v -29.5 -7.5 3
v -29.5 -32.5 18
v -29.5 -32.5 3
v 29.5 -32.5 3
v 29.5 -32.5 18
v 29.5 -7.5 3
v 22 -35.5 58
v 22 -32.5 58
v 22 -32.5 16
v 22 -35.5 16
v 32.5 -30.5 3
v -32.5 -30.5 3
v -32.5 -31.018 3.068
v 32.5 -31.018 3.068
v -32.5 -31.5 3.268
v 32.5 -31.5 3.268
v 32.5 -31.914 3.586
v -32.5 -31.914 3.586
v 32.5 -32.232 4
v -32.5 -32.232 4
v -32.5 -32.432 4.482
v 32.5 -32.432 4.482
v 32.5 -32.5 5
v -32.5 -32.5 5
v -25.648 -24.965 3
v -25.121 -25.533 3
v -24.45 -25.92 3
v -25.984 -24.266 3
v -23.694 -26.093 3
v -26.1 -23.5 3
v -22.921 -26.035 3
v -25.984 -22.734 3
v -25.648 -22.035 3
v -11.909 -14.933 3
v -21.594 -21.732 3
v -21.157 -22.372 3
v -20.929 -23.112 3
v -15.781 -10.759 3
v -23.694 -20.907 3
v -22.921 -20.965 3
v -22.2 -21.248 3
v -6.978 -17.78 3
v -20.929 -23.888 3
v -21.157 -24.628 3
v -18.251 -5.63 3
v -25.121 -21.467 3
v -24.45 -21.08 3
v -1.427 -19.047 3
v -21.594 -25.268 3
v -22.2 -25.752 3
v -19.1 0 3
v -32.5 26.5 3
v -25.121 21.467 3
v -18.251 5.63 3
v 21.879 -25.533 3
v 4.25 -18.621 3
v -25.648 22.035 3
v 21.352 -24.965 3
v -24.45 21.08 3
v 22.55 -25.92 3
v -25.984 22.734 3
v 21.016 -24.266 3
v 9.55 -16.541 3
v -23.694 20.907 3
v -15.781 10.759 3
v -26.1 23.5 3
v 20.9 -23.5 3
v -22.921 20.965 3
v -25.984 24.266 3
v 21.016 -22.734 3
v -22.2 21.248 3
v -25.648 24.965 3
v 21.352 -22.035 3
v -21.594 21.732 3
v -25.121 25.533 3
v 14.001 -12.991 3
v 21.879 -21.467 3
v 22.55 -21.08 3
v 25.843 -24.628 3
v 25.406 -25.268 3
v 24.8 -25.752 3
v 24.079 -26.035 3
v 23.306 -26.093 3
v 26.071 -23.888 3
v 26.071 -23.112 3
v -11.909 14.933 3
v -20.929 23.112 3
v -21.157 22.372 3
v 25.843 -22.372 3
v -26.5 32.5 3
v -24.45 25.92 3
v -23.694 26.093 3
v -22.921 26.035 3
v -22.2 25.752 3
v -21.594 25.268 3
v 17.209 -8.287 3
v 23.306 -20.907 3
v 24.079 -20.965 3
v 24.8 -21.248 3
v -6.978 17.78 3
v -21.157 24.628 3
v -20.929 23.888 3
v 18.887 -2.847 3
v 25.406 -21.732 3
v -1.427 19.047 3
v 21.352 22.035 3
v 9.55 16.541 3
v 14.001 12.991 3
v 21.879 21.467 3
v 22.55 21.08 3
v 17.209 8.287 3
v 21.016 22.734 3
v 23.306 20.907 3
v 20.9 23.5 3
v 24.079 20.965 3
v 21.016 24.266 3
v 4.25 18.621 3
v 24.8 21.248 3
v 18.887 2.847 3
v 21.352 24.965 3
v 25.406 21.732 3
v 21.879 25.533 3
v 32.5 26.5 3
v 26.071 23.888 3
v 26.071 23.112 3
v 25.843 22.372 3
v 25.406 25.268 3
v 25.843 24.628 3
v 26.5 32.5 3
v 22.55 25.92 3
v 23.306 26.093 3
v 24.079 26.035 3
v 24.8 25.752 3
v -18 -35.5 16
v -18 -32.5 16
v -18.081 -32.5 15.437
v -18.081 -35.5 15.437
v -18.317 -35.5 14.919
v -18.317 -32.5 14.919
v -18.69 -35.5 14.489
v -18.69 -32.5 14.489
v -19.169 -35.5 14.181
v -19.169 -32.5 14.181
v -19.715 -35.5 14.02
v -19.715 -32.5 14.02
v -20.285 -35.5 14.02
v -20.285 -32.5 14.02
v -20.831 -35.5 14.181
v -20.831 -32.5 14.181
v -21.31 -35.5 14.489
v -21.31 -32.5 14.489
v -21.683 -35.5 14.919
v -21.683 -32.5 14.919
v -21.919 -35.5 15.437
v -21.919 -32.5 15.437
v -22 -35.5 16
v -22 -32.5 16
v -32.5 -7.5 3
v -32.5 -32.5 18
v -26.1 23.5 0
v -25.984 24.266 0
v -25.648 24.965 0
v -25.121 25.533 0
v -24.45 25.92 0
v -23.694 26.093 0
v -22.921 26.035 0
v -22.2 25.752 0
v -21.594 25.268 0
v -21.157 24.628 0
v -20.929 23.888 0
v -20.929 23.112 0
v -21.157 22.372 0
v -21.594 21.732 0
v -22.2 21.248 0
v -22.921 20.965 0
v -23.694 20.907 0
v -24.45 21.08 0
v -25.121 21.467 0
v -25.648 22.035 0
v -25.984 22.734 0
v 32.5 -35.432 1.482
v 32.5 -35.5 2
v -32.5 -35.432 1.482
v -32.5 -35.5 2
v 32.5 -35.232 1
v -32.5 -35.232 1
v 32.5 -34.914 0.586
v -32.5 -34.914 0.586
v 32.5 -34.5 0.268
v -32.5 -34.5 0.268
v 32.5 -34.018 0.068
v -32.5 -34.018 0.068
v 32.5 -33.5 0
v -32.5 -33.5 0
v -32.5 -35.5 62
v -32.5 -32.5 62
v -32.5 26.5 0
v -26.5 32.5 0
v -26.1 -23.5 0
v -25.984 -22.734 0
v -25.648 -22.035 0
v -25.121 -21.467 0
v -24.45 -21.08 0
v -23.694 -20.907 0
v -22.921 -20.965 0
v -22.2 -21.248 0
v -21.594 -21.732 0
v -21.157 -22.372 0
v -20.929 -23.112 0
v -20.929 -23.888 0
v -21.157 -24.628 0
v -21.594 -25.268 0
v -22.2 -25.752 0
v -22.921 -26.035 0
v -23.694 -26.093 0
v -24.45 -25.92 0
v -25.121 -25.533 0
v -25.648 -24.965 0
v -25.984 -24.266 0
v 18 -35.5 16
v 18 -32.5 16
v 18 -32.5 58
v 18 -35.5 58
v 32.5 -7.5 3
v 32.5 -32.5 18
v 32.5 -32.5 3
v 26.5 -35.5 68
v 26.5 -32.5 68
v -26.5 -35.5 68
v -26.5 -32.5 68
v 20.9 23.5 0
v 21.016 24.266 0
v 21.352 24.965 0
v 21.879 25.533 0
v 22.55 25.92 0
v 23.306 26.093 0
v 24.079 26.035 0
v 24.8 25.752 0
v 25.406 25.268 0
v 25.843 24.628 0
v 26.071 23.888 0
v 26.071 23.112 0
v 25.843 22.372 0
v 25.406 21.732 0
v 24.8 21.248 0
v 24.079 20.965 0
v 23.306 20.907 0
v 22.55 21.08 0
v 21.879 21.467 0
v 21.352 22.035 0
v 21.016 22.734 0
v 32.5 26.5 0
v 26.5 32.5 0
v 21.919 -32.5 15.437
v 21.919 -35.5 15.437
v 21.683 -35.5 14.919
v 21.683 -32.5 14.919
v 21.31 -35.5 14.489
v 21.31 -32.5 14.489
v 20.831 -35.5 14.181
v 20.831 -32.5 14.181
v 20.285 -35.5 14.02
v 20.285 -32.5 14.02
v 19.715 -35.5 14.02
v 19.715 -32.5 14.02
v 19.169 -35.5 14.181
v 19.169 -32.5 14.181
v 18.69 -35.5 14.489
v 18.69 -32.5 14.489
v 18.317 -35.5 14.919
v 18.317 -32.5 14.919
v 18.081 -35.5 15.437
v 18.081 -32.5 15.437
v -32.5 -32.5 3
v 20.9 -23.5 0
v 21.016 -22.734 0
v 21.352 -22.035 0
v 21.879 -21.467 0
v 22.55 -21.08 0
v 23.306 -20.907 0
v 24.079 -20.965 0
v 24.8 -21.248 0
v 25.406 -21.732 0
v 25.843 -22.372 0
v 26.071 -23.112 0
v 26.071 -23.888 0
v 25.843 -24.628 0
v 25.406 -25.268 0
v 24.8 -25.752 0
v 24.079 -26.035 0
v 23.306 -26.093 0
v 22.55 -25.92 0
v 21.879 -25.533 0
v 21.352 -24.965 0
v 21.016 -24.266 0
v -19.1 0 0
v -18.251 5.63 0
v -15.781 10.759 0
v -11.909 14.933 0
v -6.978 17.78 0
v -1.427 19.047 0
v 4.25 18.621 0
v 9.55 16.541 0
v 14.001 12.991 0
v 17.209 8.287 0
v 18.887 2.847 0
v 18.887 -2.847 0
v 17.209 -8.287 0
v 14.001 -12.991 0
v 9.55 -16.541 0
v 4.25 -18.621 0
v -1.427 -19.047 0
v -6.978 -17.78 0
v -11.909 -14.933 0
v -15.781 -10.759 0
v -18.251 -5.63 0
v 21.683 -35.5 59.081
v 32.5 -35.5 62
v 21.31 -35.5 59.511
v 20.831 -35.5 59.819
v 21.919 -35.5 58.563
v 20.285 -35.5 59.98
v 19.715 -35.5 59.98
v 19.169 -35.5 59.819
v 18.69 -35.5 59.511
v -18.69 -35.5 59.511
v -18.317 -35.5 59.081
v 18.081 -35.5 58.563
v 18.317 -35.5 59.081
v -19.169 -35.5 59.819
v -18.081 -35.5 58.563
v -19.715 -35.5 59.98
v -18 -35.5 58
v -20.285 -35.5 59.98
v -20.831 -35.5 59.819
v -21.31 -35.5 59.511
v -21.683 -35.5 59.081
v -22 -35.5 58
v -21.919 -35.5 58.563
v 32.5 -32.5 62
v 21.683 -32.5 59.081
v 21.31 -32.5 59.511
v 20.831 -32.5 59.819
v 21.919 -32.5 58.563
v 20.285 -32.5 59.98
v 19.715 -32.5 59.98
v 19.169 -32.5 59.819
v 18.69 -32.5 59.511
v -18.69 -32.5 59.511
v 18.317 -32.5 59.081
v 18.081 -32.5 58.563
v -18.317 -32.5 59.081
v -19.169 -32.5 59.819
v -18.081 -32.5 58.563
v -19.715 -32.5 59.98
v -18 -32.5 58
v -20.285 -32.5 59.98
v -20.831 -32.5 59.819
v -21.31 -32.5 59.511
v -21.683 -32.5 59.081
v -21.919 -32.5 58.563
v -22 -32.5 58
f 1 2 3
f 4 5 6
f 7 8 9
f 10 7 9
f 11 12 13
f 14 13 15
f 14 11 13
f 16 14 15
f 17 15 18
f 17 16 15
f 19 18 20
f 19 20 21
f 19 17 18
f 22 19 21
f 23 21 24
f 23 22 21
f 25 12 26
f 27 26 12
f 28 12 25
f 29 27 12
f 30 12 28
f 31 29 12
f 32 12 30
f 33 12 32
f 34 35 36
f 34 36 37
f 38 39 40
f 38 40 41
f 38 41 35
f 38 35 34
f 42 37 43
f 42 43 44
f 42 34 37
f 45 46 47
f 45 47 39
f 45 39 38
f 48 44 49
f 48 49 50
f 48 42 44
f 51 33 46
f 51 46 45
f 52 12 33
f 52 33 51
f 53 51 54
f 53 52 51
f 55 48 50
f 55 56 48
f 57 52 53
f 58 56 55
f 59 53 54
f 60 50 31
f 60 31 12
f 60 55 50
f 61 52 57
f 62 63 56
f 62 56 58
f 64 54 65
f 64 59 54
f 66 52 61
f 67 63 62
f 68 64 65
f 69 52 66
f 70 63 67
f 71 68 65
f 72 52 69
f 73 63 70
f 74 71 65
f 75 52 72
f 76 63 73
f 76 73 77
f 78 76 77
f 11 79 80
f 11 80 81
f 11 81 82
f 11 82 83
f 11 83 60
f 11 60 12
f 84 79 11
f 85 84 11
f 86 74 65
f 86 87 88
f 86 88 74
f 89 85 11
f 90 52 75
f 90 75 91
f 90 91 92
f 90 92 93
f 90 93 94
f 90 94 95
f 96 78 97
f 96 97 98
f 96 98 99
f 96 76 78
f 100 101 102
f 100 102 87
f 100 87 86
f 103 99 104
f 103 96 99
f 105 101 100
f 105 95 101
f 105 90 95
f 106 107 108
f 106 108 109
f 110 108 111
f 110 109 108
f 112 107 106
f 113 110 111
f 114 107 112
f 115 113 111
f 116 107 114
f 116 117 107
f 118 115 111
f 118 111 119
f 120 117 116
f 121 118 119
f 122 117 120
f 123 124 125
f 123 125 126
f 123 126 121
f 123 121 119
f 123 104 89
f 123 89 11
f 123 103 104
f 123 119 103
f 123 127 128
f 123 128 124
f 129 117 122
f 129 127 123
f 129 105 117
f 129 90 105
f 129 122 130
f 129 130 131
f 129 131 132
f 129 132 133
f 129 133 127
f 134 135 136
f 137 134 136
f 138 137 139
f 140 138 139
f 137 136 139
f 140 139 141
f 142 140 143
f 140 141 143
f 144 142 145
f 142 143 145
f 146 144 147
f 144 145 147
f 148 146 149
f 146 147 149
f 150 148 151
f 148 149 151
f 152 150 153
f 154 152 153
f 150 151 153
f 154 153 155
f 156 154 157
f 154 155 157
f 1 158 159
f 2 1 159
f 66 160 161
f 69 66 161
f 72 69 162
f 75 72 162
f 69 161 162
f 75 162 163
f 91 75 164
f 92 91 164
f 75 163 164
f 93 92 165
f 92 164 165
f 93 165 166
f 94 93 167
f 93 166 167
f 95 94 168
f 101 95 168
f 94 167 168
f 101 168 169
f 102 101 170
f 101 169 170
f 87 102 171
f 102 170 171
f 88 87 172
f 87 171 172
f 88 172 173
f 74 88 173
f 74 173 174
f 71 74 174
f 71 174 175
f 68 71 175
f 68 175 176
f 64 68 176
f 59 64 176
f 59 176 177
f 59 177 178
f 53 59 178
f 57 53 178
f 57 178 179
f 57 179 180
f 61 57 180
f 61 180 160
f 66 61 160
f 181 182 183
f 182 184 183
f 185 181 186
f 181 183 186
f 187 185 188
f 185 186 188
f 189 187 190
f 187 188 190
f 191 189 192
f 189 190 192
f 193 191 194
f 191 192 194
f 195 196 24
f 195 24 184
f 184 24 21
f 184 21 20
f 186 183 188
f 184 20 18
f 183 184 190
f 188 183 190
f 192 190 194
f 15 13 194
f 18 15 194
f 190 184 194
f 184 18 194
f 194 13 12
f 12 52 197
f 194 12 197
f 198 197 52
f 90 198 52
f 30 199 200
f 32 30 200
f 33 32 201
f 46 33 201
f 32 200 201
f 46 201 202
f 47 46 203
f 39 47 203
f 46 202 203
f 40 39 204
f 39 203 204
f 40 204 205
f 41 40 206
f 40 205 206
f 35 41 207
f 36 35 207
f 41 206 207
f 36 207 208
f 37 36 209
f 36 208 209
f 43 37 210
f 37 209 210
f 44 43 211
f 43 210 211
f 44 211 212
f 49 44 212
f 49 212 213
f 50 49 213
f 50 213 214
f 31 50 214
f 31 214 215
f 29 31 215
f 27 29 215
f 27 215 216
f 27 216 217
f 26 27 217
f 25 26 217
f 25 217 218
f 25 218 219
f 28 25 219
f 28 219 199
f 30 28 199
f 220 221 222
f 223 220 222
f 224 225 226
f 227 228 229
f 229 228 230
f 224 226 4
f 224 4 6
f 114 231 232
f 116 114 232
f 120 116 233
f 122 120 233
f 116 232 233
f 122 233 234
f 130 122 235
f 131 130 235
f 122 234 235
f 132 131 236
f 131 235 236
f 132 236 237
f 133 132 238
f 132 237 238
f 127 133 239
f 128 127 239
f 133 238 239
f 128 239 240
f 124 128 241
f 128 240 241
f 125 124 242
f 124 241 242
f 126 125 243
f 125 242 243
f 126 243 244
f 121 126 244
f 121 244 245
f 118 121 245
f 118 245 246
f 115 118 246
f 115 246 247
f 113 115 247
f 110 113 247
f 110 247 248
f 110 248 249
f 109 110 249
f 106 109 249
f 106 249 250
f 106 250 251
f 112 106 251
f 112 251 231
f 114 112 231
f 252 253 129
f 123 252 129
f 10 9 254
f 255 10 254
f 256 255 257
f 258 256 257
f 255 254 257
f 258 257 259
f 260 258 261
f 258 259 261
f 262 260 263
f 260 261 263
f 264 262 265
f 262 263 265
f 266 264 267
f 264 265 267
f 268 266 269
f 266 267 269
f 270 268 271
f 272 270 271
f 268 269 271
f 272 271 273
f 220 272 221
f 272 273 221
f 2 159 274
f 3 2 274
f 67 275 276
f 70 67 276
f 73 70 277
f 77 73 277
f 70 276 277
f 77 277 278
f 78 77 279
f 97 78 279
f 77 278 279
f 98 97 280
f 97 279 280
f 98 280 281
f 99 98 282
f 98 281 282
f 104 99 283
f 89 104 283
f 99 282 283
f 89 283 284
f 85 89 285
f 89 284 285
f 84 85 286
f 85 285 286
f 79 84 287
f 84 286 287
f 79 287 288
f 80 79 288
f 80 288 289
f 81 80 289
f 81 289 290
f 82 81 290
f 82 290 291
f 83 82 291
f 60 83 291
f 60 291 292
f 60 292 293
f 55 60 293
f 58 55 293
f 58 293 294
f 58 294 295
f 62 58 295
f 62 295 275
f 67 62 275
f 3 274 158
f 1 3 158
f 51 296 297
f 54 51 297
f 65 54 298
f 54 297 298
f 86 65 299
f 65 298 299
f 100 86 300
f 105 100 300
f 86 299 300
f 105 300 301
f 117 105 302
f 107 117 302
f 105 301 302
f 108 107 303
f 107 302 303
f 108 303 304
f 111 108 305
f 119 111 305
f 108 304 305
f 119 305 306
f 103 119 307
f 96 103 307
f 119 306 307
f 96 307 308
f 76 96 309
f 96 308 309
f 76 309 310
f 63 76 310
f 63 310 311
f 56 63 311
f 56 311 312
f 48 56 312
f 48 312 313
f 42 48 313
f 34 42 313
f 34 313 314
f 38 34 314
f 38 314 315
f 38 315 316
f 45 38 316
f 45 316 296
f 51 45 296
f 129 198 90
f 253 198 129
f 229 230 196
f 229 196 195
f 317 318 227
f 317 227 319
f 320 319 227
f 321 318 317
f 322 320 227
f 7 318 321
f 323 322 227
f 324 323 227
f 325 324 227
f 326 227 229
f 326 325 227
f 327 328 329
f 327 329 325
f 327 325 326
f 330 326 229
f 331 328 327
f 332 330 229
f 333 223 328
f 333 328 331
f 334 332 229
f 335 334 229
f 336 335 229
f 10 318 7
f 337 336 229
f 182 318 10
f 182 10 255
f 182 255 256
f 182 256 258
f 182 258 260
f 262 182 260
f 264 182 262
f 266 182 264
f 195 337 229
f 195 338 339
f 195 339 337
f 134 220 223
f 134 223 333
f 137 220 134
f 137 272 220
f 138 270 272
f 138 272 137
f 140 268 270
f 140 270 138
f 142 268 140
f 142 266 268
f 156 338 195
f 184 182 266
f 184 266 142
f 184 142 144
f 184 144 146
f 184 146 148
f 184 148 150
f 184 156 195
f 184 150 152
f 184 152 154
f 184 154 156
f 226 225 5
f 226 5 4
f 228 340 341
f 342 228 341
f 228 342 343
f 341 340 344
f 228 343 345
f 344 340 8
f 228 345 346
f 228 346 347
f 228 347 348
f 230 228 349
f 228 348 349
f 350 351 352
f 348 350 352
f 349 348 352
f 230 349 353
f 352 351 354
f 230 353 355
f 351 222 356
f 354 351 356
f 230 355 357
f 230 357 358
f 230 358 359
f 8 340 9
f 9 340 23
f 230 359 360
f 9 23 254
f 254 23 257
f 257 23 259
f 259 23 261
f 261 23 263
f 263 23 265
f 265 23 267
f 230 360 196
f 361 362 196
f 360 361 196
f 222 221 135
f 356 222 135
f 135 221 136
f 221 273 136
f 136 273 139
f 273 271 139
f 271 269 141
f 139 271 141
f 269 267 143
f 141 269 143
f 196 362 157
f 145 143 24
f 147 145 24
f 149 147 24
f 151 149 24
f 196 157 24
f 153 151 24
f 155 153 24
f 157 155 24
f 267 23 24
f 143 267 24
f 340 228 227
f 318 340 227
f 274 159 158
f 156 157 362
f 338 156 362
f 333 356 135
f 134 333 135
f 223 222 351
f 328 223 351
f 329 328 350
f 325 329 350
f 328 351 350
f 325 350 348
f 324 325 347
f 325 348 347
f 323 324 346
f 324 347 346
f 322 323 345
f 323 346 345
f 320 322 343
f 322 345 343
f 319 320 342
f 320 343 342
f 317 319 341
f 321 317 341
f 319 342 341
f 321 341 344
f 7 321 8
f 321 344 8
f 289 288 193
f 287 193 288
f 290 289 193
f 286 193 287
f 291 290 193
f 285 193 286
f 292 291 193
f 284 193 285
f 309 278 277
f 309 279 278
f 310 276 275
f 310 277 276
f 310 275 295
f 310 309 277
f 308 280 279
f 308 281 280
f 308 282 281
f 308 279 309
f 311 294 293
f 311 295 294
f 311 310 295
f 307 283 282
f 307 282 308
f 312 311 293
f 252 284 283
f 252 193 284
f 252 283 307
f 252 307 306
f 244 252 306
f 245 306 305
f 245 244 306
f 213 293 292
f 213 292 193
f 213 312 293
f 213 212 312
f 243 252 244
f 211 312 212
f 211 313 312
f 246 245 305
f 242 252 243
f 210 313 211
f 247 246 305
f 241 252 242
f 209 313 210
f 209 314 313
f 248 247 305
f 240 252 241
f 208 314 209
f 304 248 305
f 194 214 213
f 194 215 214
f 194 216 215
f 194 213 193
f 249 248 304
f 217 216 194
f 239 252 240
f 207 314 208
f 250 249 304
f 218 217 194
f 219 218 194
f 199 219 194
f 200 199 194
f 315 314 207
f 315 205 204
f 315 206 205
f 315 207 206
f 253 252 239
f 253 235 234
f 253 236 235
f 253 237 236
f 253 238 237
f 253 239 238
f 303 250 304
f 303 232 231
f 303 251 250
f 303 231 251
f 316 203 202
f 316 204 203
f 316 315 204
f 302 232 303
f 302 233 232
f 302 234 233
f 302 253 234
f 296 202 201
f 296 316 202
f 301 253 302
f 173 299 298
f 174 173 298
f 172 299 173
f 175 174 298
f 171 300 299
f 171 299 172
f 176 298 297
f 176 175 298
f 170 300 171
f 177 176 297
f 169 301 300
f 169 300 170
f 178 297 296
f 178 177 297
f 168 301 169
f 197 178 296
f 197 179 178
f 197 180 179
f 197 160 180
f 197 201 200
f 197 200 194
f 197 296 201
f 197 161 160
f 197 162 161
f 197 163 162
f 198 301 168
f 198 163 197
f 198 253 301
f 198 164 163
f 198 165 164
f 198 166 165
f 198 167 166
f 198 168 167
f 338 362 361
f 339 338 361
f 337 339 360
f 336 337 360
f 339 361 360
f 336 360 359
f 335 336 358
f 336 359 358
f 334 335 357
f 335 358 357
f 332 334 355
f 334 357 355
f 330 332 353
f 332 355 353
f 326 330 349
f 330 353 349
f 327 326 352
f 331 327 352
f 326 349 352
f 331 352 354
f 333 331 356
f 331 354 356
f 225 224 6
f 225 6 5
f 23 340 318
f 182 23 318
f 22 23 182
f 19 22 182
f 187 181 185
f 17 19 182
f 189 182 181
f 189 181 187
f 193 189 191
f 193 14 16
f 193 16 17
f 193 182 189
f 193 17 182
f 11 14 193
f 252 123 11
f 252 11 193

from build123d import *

# Parameters (mm, degrees)
SKETCH1_W                      = 65
SKETCH1_H                      = 65
BOSS_EXTRUDE1_DEPTH            = 3
SKETCH3_W                      = 65
SKETCH3_H                      = 68
BOSS_EXTRUDE2_DEPTH            = 3
F_5_2_5_2_DIAMETER_HOLE1_D     = 5.2
F_5_2_5_2_DIAMETER_HOLE1_DEPTH = 25.4
F_5_2_5_2_DIAMETER_HOLE1_TIP   = 1.562237609
F_5_2_5_2_DIAMETER_HOLE2_D     = 38.2
F_5_2_5_2_DIAMETER_HOLE2_DEPTH = 25.4
F_5_2_5_2_DIAMETER_HOLE2_TIP   = 11.476437823
FILLET1_R                      = 2
BOSS_EXTRUDE3_DEPTH            = 3
BOSS_EXTRUDE4_DEPTH            = 3
CHAMFER1_SIZE                  = 6


with BuildPart() as part:
    # Sketch1 → Boss-Extrude1 (new body)
    with BuildSketch(Plane.XY):
        Rectangle(SKETCH1_W, SKETCH1_H)
    extrude(amount=BOSS_EXTRUDE1_DEPTH)

    # Sketch3 → Boss-Extrude2 (add)
    with BuildSketch(Plane(origin=(0, -32.5, 0), x_dir=(-1, 0, 0), z_dir=(0, -1, 0))):
        with Locations((0, -34)):
            Rectangle(SKETCH3_W, SKETCH3_H)
        with BuildLine():
            Line((18, -58), (18, -16))
            ThreePointArc((18, -16), (20, -14), (22, -16))
            Line((22, -16), (22, -58))
            ThreePointArc((22, -58), (20, -60), (18, -58))
        make_face(mode=Mode.SUBTRACT)
        with BuildLine():
            Line((-22, -58), (-22, -16))
            ThreePointArc((-22, -16), (-20, -14), (-18, -16))
            Line((-18, -16), (-18, -58))
            ThreePointArc((-18, -58), (-20, -60), (-22, -58))
        make_face(mode=Mode.SUBTRACT)
    extrude(amount=BOSS_EXTRUDE2_DEPTH)

    # Ø5.2 (5.2) Diameter Hole1
    with Locations(Plane.XY.offset(3)):
        with Locations((-23.5, 23.5), (23.5, 23.5), (23.5, -23.5), (-23.5, -23.5)):
            Hole(F_5_2_5_2_DIAMETER_HOLE1_D / 2, depth=F_5_2_5_2_DIAMETER_HOLE1_DEPTH)
            with Locations((0, 0, -(F_5_2_5_2_DIAMETER_HOLE1_DEPTH + F_5_2_5_2_DIAMETER_HOLE1_TIP / 2))):  # 118° drill point
                Cone(0, F_5_2_5_2_DIAMETER_HOLE1_D / 2, F_5_2_5_2_DIAMETER_HOLE1_TIP, mode=Mode.SUBTRACT)

    # Ø5.2 (5.2) Diameter Hole2
    with Locations(Plane.XY.offset(3)):
        with Locations((0, 0)):
            Hole(F_5_2_5_2_DIAMETER_HOLE2_D / 2, depth=F_5_2_5_2_DIAMETER_HOLE2_DEPTH)
            with Locations((0, 0, -(F_5_2_5_2_DIAMETER_HOLE2_DEPTH + F_5_2_5_2_DIAMETER_HOLE2_TIP / 2))):  # 118° drill point
                Cone(0, F_5_2_5_2_DIAMETER_HOLE2_D / 2, F_5_2_5_2_DIAMETER_HOLE2_TIP, mode=Mode.SUBTRACT)

    # Fillet1
    fillet1_edges = [part.edges().sort_by_distance(p)[0] for p in [
        (0, -35.5, 0),
        (0, -32.5, 3),
    ]]
    fillet(fillet1_edges, radius=FILLET1_R)

    # Chamfer1
    chamfer1_edges = [part.edges().sort_by_distance(p)[0] for p in [
        (-32.5, 32.5, 1.5),
        (-32.5, -34, 68),
        (32.5, -34, 68),
        (32.5, 32.5, 1.5),
    ]]
    chamfer(chamfer1_edges, length=CHAMFER1_SIZE)


with BuildPart() as body_2:
    # Sketch8 → Boss-Extrude3 (new body)
    with BuildSketch(Plane(origin=(32.5, 0, 0), x_dir=(0, 0, -1), z_dir=(1, 0, 0))):
        Polygon((-3, -7.5), (-18, -32.5), (-3, -32.5), align=None)
    extrude(amount=-BOSS_EXTRUDE3_DEPTH)


with BuildPart() as body_3:
    # Sketch9 → Boss-Extrude4 (new body)
    with BuildSketch(Plane.ZY.offset(32.5)):
        Polygon((3, -7.5), (18, -32.5), (3, -32.5), align=None)
    extrude(amount=-BOSS_EXTRUDE4_DEPTH)


solid = Compound([part.part, body_2.part, body_3.part])
